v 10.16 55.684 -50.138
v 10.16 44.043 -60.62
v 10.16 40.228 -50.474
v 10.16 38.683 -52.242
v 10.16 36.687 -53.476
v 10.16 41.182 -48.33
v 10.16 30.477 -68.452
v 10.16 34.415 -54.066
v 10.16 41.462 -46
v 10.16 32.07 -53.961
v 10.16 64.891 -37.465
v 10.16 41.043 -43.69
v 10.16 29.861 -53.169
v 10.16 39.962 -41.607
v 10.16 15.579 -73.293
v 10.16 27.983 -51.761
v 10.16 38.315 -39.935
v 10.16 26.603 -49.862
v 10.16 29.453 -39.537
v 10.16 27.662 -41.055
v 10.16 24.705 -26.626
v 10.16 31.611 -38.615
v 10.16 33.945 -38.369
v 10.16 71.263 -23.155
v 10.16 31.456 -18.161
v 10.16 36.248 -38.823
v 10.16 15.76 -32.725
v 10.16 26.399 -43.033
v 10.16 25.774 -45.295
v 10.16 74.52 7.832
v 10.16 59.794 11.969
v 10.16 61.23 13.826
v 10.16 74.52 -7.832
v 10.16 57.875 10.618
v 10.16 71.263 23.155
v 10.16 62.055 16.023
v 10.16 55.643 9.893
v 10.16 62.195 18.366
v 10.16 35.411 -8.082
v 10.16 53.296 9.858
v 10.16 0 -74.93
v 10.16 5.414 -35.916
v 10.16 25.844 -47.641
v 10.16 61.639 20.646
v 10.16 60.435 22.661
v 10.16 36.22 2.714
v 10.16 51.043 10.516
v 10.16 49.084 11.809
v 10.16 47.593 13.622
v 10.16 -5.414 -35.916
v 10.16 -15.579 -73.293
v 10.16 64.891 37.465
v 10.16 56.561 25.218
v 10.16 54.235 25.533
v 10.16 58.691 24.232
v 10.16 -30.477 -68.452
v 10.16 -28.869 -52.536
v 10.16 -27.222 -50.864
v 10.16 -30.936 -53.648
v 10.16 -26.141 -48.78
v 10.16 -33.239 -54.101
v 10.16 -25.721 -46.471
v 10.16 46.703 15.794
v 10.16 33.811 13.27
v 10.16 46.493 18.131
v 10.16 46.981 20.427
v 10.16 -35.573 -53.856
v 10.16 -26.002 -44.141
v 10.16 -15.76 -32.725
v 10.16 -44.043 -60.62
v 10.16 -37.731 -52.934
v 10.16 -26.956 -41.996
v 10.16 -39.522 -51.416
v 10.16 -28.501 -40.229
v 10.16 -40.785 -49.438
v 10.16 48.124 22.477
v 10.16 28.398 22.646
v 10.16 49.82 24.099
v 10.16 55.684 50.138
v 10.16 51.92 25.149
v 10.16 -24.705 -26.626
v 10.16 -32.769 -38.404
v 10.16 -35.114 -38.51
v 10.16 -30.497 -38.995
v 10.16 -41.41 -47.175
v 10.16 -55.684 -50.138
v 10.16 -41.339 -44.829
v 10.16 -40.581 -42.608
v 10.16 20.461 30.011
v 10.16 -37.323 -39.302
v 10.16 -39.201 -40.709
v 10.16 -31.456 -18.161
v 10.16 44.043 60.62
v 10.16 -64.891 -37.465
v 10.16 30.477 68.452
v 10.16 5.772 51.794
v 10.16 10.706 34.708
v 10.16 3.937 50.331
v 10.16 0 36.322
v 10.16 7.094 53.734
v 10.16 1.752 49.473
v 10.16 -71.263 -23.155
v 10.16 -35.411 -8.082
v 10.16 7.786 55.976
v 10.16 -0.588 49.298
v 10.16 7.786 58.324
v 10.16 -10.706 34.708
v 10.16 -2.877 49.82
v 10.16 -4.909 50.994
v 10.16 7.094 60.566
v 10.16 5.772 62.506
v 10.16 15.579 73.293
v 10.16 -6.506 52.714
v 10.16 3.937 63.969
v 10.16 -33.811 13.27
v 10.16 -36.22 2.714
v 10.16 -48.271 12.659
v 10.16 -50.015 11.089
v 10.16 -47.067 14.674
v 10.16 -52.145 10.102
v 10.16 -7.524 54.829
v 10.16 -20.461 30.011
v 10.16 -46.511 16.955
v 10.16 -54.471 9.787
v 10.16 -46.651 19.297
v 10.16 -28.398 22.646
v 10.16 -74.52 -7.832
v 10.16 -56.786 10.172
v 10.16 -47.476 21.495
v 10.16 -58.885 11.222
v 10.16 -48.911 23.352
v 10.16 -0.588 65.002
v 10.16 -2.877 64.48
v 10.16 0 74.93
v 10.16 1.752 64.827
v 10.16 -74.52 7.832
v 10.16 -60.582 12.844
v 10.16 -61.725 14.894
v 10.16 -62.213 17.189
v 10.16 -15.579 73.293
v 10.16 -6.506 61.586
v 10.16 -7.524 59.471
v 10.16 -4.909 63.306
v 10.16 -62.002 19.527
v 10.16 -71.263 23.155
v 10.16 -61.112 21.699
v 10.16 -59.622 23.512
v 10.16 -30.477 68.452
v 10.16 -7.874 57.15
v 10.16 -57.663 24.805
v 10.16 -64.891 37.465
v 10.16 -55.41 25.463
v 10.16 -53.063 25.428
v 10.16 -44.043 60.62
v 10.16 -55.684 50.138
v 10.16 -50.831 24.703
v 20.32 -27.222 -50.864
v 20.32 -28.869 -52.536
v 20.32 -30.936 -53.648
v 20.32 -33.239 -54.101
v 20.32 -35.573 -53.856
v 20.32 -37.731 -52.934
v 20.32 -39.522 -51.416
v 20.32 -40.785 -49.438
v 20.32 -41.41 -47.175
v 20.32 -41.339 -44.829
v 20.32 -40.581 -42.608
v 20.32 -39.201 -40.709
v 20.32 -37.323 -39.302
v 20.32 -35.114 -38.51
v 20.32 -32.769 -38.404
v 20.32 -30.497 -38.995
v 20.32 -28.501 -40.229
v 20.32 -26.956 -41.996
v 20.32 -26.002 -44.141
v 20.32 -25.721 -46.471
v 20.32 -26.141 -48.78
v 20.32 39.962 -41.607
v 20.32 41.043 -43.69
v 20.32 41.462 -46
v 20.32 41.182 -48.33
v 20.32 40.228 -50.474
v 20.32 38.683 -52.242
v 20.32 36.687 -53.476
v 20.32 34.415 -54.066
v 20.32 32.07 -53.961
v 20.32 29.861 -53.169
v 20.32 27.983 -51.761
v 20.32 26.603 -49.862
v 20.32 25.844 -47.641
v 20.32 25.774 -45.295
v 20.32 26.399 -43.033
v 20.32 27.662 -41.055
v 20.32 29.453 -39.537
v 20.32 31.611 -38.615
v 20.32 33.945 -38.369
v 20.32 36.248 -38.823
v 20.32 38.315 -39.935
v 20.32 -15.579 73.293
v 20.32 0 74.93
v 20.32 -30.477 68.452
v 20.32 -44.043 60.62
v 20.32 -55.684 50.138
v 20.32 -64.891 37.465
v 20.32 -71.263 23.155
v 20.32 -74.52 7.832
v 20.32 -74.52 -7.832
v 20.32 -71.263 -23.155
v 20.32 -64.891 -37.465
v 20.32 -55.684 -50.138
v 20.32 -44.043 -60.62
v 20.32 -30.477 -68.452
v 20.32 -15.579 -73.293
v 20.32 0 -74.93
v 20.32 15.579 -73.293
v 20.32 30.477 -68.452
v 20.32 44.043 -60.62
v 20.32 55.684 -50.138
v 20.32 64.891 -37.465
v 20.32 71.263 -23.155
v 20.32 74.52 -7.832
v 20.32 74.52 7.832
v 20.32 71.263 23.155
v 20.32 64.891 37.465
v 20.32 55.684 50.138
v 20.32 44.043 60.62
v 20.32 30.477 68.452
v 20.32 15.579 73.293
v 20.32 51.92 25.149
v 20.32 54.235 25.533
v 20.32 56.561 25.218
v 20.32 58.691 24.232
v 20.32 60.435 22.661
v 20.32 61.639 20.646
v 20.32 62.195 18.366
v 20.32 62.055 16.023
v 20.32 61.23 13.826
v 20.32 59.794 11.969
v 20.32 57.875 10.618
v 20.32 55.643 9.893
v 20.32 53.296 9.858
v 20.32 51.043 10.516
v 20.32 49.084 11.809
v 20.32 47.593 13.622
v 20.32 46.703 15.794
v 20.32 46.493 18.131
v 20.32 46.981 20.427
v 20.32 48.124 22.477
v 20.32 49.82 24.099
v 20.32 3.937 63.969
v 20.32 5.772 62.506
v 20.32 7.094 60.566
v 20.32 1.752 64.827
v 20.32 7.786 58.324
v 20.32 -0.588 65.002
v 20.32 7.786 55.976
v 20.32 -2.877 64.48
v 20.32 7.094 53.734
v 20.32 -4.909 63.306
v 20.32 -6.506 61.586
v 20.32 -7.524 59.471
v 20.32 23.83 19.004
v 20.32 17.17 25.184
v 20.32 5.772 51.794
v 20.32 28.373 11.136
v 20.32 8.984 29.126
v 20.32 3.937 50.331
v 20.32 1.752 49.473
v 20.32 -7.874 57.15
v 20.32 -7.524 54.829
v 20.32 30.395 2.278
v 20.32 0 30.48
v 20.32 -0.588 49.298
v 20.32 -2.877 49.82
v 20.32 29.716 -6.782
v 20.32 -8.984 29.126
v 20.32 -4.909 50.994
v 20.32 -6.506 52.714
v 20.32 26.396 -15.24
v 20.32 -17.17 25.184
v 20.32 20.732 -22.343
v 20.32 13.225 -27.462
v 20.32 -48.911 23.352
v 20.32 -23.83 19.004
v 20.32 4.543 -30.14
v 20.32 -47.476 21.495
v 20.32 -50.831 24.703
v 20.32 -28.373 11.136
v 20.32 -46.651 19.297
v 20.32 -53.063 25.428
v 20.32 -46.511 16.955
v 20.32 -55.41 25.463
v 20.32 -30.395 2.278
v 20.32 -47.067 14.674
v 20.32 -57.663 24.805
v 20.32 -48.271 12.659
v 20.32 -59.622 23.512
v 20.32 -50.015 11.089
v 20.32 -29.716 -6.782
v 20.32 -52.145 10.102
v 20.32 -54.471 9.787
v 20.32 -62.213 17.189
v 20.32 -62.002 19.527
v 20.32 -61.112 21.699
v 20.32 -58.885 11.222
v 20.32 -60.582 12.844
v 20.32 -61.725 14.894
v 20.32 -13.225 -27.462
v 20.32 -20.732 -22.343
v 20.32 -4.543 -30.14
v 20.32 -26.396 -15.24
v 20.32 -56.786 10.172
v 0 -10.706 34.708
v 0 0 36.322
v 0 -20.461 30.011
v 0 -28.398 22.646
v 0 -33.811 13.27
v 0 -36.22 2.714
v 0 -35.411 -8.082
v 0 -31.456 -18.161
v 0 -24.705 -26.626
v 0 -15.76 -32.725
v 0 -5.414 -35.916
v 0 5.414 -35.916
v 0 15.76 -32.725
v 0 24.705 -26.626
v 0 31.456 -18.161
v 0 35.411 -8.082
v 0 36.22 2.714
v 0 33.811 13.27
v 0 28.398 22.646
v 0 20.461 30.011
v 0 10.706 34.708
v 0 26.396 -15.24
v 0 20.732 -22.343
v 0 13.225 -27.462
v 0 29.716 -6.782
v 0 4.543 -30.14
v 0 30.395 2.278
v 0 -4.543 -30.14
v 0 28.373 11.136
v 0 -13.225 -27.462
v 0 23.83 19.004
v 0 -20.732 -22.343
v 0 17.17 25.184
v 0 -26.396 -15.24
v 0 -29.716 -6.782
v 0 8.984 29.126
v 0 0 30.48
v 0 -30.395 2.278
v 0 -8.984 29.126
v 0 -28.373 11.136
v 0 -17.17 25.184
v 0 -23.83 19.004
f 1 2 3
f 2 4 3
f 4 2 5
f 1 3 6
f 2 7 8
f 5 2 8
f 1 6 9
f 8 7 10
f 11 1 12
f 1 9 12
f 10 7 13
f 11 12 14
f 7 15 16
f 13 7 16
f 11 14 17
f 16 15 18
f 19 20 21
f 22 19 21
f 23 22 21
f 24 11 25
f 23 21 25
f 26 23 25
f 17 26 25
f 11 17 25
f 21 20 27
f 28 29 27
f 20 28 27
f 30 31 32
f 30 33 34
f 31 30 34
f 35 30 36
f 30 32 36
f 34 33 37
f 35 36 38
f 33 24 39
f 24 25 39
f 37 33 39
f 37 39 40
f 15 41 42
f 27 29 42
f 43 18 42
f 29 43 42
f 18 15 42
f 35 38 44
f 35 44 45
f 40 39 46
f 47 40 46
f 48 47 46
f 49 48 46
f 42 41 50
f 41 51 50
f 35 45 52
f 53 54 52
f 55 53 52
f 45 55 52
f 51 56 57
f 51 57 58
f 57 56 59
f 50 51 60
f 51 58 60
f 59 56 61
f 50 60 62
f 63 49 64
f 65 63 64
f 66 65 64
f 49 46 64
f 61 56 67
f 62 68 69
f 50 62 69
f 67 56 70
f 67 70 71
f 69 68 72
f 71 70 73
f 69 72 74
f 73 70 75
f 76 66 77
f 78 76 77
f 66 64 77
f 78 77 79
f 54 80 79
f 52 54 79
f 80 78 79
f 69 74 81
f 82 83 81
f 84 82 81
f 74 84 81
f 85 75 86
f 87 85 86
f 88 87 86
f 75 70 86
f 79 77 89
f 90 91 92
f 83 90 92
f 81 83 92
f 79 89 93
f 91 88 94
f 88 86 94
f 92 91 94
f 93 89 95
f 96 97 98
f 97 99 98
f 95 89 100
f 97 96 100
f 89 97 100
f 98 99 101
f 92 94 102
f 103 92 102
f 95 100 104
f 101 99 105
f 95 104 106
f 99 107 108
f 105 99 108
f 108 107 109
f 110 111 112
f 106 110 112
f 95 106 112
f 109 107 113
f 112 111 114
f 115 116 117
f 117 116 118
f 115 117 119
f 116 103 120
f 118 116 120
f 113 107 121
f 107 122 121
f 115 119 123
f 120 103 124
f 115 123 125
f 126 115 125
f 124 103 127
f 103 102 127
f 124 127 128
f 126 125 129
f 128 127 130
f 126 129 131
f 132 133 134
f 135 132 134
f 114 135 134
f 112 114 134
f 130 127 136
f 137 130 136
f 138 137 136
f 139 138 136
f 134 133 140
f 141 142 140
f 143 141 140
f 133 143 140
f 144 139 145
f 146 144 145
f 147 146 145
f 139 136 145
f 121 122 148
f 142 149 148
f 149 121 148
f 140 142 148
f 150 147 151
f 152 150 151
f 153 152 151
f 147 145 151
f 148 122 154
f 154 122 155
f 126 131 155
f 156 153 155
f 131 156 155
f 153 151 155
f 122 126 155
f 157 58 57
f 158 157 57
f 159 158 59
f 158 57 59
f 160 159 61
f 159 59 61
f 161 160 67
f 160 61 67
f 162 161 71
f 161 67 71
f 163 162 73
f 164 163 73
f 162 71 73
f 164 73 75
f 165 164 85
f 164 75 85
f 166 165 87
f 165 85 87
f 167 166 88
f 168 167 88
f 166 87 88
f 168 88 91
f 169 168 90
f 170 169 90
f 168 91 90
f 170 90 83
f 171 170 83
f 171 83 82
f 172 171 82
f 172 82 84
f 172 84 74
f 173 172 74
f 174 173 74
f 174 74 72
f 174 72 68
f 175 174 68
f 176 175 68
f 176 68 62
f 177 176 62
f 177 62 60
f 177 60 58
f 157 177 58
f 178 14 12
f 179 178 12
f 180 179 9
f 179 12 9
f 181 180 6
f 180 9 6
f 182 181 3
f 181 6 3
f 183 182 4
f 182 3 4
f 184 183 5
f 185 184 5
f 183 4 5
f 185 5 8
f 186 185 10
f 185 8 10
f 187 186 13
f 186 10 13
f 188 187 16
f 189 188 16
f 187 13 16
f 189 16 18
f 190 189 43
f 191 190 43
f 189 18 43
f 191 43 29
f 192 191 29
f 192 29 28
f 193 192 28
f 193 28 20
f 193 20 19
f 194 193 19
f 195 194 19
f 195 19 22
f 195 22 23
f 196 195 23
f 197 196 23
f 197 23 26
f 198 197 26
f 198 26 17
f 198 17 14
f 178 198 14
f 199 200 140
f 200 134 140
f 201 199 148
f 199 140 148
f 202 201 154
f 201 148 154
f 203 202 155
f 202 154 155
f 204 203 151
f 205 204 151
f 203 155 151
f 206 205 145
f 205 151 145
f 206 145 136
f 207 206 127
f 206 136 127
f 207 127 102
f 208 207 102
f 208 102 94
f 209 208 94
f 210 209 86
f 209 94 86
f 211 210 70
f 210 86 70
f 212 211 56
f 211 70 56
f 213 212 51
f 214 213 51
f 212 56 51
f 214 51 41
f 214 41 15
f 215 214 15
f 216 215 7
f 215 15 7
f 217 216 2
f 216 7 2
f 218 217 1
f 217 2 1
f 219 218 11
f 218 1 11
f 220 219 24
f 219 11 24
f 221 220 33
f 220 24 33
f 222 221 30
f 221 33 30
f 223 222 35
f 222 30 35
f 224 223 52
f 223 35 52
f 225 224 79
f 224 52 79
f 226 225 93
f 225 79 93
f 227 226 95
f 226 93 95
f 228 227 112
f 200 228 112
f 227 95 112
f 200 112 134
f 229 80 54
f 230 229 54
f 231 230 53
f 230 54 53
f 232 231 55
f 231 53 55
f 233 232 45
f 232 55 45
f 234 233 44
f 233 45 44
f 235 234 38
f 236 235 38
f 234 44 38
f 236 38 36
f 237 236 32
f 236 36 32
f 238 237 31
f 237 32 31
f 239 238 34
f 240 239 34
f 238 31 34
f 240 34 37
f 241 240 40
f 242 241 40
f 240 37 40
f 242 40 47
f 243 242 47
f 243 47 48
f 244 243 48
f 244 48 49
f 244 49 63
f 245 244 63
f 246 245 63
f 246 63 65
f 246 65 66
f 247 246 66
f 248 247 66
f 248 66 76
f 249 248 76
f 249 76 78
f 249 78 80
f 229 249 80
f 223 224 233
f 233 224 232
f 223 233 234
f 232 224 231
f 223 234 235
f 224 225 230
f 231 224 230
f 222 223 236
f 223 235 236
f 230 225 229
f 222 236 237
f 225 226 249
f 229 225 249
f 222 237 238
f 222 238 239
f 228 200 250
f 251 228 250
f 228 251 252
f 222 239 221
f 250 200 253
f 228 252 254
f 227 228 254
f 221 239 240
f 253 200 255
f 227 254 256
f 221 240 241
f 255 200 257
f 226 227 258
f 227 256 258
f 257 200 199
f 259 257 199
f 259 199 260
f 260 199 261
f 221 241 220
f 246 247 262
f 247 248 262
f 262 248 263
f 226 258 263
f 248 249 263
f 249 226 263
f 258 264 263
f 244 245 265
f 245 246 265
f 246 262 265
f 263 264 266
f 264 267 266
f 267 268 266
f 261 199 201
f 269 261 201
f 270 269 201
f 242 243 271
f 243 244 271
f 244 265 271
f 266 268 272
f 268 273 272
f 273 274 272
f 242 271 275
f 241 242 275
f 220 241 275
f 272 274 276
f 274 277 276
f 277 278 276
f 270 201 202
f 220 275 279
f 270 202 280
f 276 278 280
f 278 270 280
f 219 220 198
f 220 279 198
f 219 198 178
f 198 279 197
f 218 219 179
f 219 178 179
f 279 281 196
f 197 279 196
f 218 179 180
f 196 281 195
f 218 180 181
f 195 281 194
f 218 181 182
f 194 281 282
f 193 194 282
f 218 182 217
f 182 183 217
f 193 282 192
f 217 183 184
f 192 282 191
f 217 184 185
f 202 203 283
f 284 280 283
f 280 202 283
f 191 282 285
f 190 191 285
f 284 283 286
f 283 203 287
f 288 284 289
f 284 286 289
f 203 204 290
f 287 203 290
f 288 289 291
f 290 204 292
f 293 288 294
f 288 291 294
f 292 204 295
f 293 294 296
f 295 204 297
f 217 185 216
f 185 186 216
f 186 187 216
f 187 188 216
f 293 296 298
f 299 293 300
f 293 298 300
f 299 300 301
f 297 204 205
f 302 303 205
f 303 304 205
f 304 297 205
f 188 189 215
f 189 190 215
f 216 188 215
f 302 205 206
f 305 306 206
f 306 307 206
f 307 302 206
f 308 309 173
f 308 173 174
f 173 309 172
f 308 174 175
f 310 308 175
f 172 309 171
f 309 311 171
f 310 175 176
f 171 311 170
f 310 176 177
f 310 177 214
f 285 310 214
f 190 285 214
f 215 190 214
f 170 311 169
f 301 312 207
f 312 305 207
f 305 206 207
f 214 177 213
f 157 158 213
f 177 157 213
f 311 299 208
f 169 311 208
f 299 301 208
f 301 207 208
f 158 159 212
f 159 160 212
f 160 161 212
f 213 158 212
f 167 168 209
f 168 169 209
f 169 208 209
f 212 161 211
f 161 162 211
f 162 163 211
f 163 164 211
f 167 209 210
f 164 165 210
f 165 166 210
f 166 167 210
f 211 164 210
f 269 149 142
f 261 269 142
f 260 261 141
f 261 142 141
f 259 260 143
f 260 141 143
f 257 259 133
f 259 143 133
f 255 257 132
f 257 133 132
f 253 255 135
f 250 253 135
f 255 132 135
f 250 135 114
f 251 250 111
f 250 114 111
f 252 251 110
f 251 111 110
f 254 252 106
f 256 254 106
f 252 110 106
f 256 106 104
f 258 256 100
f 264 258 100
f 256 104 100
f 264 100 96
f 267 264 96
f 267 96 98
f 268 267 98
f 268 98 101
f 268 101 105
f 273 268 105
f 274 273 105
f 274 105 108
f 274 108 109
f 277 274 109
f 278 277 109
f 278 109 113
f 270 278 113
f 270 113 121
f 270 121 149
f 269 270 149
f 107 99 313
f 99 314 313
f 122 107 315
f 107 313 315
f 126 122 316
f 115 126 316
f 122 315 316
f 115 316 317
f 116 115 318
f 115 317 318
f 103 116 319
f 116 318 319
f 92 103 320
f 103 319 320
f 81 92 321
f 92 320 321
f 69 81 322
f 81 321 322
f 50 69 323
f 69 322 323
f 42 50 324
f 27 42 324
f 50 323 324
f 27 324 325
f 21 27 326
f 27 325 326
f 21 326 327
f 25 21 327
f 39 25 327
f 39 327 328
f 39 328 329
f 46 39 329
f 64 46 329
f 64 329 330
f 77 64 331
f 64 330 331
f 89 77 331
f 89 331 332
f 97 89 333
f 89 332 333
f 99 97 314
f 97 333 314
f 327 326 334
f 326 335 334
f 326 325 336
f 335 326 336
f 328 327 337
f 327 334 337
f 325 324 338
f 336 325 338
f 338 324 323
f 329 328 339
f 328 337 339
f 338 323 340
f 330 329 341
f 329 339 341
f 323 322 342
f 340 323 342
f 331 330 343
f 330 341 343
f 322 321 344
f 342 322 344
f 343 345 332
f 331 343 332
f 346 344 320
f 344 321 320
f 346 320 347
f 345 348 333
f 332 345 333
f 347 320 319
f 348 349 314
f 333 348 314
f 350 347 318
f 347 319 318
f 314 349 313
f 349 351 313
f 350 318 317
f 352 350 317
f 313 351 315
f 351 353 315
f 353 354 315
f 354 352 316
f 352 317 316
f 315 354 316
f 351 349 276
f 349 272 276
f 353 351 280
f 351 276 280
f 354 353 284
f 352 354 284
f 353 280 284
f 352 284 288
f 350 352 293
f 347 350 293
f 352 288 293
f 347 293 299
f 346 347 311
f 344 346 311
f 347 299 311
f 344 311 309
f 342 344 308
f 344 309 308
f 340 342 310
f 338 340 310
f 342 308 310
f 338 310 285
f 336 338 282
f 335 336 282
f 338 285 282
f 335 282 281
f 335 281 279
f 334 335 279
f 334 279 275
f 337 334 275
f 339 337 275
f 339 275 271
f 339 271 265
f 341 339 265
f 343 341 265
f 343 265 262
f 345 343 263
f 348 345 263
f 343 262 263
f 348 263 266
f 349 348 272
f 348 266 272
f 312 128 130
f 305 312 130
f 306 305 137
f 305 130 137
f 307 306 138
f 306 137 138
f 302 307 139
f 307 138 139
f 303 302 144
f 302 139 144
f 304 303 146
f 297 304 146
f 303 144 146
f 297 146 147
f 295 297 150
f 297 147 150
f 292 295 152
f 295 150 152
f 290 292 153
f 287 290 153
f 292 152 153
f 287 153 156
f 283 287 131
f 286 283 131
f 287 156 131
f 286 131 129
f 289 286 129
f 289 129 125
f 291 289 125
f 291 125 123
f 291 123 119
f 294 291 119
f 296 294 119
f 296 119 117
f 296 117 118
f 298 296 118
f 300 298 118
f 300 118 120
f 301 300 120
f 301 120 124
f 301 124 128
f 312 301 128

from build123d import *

# Parameters (mm, degrees)
F3_R            = 7.874
F4_DEPTH        = 10.161
F4_COPIES_COUNT = 5


# Not quite as in the source:
# - a pattern or mirror of a feature is missing from the dataset's text; its kind, count and spacing are read off the source's solid


with BuildPart() as f2:
    # F1 (on Front) → F2 (revolve)
    with BuildSketch(Plane.XZ):
        Polygon((0, 36.322), (0, 30.48), (20.32, 30.48), (20.32, 74.93), (10.16, 74.93), (10.16, 36.322), align=None)
    revolve(axis=Axis((6.4773708582, 0, 0), (1, 0, 0)))

    # F3 (on face) → F4 (cut, through all)
    with BuildSketch(Plane(origin=(10.16, 0, 0), x_dir=(0, -1, 0), z_dir=(-1, 0, 0))):
        with Locations((0, 57.15)):
            Circle(F3_R)
    f4 = extrude(amount=-F4_DEPTH, mode=Mode.SUBTRACT)

    # F4_copies: F4 ×5 about axis
    f4_copies_axis = Axis((0, 0, 0), (1, 0, 0))
    for i in range(1, F4_COPIES_COUNT):
        add(f4.rotate(f4_copies_axis, i * 360 / F4_COPIES_COUNT), mode=Mode.SUBTRACT)


solid = f2.part
